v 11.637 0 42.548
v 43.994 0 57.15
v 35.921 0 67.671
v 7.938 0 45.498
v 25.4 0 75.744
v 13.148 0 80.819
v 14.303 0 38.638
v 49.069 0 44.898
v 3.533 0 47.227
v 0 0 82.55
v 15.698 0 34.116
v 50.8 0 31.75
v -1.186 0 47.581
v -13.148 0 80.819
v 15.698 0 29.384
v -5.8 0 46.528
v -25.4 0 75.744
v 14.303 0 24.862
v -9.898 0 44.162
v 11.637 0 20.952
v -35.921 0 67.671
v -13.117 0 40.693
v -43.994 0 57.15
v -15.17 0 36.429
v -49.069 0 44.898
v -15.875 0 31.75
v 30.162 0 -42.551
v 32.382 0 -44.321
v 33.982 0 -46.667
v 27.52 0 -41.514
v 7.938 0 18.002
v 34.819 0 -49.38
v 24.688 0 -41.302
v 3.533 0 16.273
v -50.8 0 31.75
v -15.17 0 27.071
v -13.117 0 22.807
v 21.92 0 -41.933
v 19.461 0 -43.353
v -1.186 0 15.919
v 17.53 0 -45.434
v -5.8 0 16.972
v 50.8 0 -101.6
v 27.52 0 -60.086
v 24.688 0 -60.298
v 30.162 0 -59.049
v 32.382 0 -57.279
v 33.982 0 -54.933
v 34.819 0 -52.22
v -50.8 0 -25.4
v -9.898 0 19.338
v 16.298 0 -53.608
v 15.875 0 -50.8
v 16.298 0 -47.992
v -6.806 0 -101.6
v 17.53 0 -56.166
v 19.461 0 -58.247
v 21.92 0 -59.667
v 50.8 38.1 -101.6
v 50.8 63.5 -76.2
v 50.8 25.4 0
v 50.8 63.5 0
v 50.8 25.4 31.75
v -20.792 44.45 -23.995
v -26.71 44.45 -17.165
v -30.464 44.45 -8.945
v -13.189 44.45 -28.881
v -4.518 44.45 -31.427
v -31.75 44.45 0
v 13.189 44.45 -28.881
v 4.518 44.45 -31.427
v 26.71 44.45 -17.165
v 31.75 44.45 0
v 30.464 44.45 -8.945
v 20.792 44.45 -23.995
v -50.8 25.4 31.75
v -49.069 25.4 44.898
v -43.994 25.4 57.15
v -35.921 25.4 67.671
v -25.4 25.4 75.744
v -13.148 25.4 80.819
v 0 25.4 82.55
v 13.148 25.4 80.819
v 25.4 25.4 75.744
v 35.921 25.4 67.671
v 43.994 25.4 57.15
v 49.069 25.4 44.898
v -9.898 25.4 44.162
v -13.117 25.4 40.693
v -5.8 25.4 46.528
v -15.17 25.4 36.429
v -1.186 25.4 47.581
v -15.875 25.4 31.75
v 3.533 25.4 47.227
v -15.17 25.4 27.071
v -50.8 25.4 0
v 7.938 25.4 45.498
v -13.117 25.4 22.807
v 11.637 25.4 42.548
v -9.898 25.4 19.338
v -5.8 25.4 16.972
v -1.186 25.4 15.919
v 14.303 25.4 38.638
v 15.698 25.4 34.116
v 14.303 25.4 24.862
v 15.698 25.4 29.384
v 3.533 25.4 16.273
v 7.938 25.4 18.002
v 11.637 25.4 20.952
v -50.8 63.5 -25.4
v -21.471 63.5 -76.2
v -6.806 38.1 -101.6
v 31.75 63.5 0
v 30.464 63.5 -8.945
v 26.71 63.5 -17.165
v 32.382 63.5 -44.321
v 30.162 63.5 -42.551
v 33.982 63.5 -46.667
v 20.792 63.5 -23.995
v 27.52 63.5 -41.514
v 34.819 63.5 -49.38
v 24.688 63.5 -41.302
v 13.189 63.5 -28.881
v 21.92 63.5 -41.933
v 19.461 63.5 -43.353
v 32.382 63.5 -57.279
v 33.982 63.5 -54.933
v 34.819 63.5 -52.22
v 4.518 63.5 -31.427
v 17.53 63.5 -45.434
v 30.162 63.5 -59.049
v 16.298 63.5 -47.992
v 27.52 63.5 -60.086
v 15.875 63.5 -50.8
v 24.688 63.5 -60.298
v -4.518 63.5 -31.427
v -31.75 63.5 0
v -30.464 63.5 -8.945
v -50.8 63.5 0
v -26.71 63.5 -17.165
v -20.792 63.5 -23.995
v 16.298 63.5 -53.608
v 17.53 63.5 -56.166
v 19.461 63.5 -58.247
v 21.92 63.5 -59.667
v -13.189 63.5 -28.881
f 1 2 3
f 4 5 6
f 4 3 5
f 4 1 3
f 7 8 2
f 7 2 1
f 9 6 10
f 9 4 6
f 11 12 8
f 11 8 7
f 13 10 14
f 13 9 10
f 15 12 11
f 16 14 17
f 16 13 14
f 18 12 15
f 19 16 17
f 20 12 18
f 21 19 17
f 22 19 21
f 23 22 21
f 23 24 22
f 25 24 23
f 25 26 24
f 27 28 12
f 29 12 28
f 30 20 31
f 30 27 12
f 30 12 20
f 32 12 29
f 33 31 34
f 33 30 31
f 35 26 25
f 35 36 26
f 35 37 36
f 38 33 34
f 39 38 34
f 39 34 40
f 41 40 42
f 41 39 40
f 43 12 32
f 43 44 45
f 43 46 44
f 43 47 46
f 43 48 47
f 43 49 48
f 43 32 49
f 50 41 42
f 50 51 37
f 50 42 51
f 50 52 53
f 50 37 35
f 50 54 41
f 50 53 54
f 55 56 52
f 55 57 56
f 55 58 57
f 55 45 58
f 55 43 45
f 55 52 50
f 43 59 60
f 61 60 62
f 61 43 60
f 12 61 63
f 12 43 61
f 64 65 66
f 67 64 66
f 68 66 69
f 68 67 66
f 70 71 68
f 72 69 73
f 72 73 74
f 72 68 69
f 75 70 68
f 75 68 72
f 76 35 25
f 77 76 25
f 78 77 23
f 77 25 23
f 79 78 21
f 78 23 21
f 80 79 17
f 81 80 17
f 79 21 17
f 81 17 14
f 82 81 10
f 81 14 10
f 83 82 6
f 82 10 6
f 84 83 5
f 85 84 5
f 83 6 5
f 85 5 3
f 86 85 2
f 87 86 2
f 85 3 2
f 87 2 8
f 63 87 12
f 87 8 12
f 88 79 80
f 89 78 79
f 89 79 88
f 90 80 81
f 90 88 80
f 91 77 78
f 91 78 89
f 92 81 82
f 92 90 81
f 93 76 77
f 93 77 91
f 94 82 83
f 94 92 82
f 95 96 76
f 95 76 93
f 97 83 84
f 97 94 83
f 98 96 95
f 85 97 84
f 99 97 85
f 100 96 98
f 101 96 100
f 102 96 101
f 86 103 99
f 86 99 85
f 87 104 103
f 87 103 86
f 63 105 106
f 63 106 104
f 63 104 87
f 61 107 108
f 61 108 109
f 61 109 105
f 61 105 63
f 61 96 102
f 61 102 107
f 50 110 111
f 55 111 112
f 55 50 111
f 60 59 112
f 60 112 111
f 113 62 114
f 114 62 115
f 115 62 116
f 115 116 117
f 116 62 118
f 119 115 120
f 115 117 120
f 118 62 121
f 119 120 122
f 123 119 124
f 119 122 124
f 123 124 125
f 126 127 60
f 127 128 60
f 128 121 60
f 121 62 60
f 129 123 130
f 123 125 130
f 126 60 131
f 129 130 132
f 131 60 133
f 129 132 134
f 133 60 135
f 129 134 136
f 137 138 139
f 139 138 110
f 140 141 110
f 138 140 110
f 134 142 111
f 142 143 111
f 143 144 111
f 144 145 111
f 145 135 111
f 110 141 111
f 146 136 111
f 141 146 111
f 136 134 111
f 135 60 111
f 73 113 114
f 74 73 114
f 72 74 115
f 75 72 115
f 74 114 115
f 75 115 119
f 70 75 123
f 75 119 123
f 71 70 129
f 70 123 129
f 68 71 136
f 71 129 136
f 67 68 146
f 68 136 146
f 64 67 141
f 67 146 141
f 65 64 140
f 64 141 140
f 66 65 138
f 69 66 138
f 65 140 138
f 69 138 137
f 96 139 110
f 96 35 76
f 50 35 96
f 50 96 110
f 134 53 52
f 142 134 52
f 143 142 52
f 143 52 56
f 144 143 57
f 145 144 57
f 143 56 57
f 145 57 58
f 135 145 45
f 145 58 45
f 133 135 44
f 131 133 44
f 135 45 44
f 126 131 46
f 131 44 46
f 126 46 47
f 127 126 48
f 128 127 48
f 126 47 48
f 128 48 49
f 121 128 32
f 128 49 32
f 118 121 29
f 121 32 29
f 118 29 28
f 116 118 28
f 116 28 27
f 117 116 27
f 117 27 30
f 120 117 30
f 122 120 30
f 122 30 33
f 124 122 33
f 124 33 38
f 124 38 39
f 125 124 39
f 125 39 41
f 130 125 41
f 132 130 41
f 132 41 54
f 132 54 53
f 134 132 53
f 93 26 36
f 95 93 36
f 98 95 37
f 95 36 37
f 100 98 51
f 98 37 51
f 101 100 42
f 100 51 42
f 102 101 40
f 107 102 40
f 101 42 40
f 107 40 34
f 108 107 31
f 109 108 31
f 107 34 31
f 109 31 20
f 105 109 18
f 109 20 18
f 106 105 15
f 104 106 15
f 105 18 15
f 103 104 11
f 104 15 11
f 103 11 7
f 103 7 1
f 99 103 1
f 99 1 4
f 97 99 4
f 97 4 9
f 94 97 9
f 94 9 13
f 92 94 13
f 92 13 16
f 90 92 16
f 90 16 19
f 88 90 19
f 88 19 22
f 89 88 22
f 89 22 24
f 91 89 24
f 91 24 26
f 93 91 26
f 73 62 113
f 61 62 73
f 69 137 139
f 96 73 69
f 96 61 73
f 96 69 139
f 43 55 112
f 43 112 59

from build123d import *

# Parameters (mm, degrees)
BOSS_EXTRUDE1_DEPTH         = 25.4
BOSS_EXTRUDE2_DEPTH         = 63.5
CUT_EXTRUDE1_DEPTH          = 51.8
CUT_EXTRUDE1_DEPTH_BACK     = 51.8
F_1_4_0_75_DIAMETER_HOLE1_D = 19.05
SKETCH6_R                   = 31.75
CUT_EXTRUDE2_DEPTH          = 19.05
F_1_4_1_25_DIAMETER_HOLE1_D = 31.75


with BuildPart() as part:
    # Sketch1 → Boss-Extrude1 (new body)
    with BuildSketch(Plane(origin=(0, 0, 0), x_dir=(1, 0, 0), z_dir=(0, 1, 0))):
        with BuildLine():
            Line((-50.8, 0), (-50.8, -31.75))
            ThreePointArc((-50.8, -31.75), (0, -82.55), (50.8, -31.75))
            Line((50.8, -31.75), (50.8, 0))
            Line((50.8, 0), (-50.8, 0))
        make_face()
    extrude(amount=BOSS_EXTRUDE1_DEPTH)

    # Sketch2 → Boss-Extrude2 (add)
    with BuildSketch(Plane(origin=(0, 0, 0), x_dir=(1, 0, 0), z_dir=(0, 1, 0))):
        Polygon((-50.8, 0), (-50.8, 25.4), (-6.805909488, 101.6), (50.8, 101.6), (50.8, 0), align=None)
    extrude(amount=BOSS_EXTRUDE2_DEPTH)

    # Sketch3 → Cut-Extrude1 (cut, two sides)
    with BuildSketch(Plane(origin=(0, 0, 0), x_dir=(0, 0, -1), z_dir=(1, 0, 0))) as cut_extrude1_sk:
        Polygon((76.2, 63.5), (101.6, 63.5), (101.6, 38.1), align=None)
    extrude(amount=CUT_EXTRUDE1_DEPTH, mode=Mode.SUBTRACT)
    extrude(cut_extrude1_sk.sketch, amount=-CUT_EXTRUDE1_DEPTH_BACK, mode=Mode.SUBTRACT)

    # 1/4 (0.75) Diameter Hole1 (through all)
    with Locations(Plane(origin=(0, 63.5, 0), x_dir=(1, 0, 0), z_dir=(0, 1, 0))):
        with Locations((25.4, 50.8)):
            Hole(F_1_4_0_75_DIAMETER_HOLE1_D / 2)

    # Sketch6 → Cut-Extrude2 (cut)
    with BuildSketch(Plane(origin=(0, 63.5, 0), x_dir=(1, 0, 0), z_dir=(0, 1, 0))):
        Circle(SKETCH6_R)
    extrude(amount=-CUT_EXTRUDE2_DEPTH, mode=Mode.SUBTRACT)

    # 1/4 (1.25) Diameter Hole1 (through all)
    with Locations(Plane(origin=(0, 25.4, 0), x_dir=(1, 0, 0), z_dir=(0, 1, 0))):
        with Locations((0, -31.75)):
            Hole(F_1_4_1_25_DIAMETER_HOLE1_D / 2)


solid = part.part
